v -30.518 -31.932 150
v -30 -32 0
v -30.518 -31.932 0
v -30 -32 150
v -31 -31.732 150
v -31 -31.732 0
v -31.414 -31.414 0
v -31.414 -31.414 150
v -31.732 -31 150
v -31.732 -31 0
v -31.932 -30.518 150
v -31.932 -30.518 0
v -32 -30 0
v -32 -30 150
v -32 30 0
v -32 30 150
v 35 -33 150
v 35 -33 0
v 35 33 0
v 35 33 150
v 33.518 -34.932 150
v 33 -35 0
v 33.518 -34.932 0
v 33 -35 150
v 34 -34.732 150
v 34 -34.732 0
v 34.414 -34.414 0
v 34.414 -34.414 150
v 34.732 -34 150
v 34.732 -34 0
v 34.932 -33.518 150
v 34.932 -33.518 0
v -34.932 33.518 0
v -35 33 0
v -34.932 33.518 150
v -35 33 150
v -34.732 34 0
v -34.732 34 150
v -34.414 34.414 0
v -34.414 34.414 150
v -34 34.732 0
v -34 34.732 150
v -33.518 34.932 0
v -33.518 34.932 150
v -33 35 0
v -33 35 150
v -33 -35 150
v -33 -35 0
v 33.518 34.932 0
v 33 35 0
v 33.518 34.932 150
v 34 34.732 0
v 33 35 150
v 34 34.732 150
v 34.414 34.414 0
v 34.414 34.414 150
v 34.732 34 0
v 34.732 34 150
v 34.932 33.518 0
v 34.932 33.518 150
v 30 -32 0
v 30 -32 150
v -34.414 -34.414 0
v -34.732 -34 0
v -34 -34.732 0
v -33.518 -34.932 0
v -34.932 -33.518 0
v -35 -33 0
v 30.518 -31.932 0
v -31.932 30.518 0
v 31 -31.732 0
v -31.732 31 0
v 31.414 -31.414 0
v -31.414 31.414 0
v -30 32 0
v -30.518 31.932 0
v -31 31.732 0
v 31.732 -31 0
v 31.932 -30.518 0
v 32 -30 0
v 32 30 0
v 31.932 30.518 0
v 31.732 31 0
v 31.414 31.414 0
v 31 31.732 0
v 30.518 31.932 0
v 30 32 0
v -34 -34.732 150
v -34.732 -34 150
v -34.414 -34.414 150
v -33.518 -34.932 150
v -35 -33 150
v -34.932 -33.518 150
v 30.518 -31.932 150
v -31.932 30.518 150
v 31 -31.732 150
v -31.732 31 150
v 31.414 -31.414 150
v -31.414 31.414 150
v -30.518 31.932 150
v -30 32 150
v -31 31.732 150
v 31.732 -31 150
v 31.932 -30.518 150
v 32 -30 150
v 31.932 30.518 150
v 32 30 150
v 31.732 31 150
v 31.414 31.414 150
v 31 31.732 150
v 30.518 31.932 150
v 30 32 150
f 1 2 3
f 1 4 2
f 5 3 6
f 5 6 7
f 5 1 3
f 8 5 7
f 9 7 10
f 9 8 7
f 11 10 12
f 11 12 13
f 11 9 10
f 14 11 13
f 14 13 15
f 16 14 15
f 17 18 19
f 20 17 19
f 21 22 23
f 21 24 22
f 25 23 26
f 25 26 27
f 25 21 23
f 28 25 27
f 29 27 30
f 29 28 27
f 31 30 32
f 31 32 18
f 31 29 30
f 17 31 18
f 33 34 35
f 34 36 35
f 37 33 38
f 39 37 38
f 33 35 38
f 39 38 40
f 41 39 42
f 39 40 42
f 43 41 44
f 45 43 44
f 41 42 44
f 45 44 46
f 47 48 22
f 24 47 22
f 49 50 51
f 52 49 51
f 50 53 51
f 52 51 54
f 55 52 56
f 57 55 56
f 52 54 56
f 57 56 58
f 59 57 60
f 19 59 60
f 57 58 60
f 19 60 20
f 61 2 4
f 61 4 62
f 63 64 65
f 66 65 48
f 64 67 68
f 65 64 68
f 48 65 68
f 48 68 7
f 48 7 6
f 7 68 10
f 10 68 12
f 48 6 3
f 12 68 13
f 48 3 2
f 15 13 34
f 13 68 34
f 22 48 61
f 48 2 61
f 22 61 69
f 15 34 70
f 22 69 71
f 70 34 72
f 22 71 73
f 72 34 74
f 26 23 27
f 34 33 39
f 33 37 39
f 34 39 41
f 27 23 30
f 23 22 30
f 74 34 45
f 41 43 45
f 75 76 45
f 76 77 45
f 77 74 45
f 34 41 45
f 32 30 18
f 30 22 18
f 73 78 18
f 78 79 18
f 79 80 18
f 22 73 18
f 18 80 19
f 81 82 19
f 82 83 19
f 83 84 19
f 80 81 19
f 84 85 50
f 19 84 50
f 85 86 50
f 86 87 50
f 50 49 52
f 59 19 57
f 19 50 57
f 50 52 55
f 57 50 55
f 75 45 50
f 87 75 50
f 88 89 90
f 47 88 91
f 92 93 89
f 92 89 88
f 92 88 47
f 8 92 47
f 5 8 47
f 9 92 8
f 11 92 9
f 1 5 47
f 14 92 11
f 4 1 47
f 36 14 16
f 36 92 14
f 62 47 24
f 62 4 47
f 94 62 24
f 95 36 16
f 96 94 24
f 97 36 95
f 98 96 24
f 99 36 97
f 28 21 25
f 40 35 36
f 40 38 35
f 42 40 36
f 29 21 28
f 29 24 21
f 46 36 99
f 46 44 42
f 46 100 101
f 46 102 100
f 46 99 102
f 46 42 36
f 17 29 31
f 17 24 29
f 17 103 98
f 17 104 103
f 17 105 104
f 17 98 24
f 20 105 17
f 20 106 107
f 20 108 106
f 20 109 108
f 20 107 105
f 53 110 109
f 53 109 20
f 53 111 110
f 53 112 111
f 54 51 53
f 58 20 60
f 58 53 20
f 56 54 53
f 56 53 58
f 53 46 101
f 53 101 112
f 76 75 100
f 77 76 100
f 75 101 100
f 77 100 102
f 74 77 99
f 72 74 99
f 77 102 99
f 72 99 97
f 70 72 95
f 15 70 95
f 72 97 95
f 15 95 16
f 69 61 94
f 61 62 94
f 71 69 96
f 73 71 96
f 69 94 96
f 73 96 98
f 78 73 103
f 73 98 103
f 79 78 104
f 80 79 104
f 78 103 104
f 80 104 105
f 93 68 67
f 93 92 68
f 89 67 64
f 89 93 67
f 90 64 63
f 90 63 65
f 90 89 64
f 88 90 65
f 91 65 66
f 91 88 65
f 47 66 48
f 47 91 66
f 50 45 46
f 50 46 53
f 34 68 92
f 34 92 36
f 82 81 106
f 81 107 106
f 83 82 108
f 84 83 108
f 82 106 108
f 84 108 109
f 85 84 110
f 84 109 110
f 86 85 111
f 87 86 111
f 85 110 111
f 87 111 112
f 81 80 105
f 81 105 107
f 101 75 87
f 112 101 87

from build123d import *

# Parameters (mm, degrees)
SKETCH_1_W      = 70
SKETCH_1_H      = 70
SKETCH_1_W_2    = 64
SKETCH_1_H_2    = 64
EXTRUDE_1_DEPTH = 150
FILLET_1_R      = 2


with BuildPart() as part:
    # 草图1 → 凸台-拉伸1 (new body)
    with BuildSketch(Plane.XY):
        Rectangle(SKETCH_1_W, SKETCH_1_H)
        Rectangle(SKETCH_1_W_2, SKETCH_1_H_2, mode=Mode.SUBTRACT)
    extrude(amount=EXTRUDE_1_DEPTH)

    # 圆角1
    fillet_1_edges = [part.edges().sort_by_distance(p)[0] for p in [
        (32, -32, 75),
        (32, 32, 75),
        (-32, 32, 75),
        (-32, -32, 75),
        (35, -35, 75),
        (-35, -35, 75),
        (-35, 35, 75),
        (35, 35, 75),
    ]]
    fillet(fillet_1_edges, radius=FILLET_1_R)


solid = part.part
